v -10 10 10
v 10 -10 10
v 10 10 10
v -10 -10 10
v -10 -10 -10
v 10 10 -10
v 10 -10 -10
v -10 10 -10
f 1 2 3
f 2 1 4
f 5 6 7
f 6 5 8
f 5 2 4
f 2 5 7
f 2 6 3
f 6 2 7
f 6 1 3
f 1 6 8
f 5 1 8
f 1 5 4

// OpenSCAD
module pyramid(size, height) {
    polyhedron(
        points=[
            [0, 0, 0],  // base corner 1
            [size, 0, 0],  // base corner 2
            [size, size, 0],  // base corner 3
            [0, size, 0],  // base corner 4
            [size/2, size/2, height]  // apex
        ],
        faces=[
            [0, 1, 4],  // side 1
            [1, 2, 4],  // side 2
            [2, 3, 4],  // side 3
            [3, 0, 4],  // side 4
            [0, 1, 2, 3]  // base
        ]
    );
}

module cube_with_pyramids(cube_size, pyramid_height) {
    cube([cube_size, cube_size, cube_size], center=true);
    for (i = [-1, 1], j = [-1, 1], k = [-1, 1]) {
        if (i == 0) {  // Only position pyramid for i=0
            translate([j * cube_size / 2, k * cube_size / 2, 0])
            rotate([0, 90 - 90 * k, 90 * k * j])
            pyramid(cube_size, pyramid_height);
        }
        if (j == 0) {  // Only position pyramid for j=0
            translate([i * cube_size / 2, 0, k * cube_size / 2])
            rotate([90 - 90 * k, 0, 90 * k * i])
            pyramid(cube_size, pyramid_height);
        }
        if (k == 0) {  // Only position pyramid for k=0
            translate([0, i * cube_size / 2, j * cube_size / 2])
            rotate([90 * i, 90 - 90 * j, 0])
            pyramid(cube_size, pyramid_height);
        }
    }
}

cube_size = 20;
pyramid_height = 10;

cube_with_pyramids(cube_size, pyramid_height);
